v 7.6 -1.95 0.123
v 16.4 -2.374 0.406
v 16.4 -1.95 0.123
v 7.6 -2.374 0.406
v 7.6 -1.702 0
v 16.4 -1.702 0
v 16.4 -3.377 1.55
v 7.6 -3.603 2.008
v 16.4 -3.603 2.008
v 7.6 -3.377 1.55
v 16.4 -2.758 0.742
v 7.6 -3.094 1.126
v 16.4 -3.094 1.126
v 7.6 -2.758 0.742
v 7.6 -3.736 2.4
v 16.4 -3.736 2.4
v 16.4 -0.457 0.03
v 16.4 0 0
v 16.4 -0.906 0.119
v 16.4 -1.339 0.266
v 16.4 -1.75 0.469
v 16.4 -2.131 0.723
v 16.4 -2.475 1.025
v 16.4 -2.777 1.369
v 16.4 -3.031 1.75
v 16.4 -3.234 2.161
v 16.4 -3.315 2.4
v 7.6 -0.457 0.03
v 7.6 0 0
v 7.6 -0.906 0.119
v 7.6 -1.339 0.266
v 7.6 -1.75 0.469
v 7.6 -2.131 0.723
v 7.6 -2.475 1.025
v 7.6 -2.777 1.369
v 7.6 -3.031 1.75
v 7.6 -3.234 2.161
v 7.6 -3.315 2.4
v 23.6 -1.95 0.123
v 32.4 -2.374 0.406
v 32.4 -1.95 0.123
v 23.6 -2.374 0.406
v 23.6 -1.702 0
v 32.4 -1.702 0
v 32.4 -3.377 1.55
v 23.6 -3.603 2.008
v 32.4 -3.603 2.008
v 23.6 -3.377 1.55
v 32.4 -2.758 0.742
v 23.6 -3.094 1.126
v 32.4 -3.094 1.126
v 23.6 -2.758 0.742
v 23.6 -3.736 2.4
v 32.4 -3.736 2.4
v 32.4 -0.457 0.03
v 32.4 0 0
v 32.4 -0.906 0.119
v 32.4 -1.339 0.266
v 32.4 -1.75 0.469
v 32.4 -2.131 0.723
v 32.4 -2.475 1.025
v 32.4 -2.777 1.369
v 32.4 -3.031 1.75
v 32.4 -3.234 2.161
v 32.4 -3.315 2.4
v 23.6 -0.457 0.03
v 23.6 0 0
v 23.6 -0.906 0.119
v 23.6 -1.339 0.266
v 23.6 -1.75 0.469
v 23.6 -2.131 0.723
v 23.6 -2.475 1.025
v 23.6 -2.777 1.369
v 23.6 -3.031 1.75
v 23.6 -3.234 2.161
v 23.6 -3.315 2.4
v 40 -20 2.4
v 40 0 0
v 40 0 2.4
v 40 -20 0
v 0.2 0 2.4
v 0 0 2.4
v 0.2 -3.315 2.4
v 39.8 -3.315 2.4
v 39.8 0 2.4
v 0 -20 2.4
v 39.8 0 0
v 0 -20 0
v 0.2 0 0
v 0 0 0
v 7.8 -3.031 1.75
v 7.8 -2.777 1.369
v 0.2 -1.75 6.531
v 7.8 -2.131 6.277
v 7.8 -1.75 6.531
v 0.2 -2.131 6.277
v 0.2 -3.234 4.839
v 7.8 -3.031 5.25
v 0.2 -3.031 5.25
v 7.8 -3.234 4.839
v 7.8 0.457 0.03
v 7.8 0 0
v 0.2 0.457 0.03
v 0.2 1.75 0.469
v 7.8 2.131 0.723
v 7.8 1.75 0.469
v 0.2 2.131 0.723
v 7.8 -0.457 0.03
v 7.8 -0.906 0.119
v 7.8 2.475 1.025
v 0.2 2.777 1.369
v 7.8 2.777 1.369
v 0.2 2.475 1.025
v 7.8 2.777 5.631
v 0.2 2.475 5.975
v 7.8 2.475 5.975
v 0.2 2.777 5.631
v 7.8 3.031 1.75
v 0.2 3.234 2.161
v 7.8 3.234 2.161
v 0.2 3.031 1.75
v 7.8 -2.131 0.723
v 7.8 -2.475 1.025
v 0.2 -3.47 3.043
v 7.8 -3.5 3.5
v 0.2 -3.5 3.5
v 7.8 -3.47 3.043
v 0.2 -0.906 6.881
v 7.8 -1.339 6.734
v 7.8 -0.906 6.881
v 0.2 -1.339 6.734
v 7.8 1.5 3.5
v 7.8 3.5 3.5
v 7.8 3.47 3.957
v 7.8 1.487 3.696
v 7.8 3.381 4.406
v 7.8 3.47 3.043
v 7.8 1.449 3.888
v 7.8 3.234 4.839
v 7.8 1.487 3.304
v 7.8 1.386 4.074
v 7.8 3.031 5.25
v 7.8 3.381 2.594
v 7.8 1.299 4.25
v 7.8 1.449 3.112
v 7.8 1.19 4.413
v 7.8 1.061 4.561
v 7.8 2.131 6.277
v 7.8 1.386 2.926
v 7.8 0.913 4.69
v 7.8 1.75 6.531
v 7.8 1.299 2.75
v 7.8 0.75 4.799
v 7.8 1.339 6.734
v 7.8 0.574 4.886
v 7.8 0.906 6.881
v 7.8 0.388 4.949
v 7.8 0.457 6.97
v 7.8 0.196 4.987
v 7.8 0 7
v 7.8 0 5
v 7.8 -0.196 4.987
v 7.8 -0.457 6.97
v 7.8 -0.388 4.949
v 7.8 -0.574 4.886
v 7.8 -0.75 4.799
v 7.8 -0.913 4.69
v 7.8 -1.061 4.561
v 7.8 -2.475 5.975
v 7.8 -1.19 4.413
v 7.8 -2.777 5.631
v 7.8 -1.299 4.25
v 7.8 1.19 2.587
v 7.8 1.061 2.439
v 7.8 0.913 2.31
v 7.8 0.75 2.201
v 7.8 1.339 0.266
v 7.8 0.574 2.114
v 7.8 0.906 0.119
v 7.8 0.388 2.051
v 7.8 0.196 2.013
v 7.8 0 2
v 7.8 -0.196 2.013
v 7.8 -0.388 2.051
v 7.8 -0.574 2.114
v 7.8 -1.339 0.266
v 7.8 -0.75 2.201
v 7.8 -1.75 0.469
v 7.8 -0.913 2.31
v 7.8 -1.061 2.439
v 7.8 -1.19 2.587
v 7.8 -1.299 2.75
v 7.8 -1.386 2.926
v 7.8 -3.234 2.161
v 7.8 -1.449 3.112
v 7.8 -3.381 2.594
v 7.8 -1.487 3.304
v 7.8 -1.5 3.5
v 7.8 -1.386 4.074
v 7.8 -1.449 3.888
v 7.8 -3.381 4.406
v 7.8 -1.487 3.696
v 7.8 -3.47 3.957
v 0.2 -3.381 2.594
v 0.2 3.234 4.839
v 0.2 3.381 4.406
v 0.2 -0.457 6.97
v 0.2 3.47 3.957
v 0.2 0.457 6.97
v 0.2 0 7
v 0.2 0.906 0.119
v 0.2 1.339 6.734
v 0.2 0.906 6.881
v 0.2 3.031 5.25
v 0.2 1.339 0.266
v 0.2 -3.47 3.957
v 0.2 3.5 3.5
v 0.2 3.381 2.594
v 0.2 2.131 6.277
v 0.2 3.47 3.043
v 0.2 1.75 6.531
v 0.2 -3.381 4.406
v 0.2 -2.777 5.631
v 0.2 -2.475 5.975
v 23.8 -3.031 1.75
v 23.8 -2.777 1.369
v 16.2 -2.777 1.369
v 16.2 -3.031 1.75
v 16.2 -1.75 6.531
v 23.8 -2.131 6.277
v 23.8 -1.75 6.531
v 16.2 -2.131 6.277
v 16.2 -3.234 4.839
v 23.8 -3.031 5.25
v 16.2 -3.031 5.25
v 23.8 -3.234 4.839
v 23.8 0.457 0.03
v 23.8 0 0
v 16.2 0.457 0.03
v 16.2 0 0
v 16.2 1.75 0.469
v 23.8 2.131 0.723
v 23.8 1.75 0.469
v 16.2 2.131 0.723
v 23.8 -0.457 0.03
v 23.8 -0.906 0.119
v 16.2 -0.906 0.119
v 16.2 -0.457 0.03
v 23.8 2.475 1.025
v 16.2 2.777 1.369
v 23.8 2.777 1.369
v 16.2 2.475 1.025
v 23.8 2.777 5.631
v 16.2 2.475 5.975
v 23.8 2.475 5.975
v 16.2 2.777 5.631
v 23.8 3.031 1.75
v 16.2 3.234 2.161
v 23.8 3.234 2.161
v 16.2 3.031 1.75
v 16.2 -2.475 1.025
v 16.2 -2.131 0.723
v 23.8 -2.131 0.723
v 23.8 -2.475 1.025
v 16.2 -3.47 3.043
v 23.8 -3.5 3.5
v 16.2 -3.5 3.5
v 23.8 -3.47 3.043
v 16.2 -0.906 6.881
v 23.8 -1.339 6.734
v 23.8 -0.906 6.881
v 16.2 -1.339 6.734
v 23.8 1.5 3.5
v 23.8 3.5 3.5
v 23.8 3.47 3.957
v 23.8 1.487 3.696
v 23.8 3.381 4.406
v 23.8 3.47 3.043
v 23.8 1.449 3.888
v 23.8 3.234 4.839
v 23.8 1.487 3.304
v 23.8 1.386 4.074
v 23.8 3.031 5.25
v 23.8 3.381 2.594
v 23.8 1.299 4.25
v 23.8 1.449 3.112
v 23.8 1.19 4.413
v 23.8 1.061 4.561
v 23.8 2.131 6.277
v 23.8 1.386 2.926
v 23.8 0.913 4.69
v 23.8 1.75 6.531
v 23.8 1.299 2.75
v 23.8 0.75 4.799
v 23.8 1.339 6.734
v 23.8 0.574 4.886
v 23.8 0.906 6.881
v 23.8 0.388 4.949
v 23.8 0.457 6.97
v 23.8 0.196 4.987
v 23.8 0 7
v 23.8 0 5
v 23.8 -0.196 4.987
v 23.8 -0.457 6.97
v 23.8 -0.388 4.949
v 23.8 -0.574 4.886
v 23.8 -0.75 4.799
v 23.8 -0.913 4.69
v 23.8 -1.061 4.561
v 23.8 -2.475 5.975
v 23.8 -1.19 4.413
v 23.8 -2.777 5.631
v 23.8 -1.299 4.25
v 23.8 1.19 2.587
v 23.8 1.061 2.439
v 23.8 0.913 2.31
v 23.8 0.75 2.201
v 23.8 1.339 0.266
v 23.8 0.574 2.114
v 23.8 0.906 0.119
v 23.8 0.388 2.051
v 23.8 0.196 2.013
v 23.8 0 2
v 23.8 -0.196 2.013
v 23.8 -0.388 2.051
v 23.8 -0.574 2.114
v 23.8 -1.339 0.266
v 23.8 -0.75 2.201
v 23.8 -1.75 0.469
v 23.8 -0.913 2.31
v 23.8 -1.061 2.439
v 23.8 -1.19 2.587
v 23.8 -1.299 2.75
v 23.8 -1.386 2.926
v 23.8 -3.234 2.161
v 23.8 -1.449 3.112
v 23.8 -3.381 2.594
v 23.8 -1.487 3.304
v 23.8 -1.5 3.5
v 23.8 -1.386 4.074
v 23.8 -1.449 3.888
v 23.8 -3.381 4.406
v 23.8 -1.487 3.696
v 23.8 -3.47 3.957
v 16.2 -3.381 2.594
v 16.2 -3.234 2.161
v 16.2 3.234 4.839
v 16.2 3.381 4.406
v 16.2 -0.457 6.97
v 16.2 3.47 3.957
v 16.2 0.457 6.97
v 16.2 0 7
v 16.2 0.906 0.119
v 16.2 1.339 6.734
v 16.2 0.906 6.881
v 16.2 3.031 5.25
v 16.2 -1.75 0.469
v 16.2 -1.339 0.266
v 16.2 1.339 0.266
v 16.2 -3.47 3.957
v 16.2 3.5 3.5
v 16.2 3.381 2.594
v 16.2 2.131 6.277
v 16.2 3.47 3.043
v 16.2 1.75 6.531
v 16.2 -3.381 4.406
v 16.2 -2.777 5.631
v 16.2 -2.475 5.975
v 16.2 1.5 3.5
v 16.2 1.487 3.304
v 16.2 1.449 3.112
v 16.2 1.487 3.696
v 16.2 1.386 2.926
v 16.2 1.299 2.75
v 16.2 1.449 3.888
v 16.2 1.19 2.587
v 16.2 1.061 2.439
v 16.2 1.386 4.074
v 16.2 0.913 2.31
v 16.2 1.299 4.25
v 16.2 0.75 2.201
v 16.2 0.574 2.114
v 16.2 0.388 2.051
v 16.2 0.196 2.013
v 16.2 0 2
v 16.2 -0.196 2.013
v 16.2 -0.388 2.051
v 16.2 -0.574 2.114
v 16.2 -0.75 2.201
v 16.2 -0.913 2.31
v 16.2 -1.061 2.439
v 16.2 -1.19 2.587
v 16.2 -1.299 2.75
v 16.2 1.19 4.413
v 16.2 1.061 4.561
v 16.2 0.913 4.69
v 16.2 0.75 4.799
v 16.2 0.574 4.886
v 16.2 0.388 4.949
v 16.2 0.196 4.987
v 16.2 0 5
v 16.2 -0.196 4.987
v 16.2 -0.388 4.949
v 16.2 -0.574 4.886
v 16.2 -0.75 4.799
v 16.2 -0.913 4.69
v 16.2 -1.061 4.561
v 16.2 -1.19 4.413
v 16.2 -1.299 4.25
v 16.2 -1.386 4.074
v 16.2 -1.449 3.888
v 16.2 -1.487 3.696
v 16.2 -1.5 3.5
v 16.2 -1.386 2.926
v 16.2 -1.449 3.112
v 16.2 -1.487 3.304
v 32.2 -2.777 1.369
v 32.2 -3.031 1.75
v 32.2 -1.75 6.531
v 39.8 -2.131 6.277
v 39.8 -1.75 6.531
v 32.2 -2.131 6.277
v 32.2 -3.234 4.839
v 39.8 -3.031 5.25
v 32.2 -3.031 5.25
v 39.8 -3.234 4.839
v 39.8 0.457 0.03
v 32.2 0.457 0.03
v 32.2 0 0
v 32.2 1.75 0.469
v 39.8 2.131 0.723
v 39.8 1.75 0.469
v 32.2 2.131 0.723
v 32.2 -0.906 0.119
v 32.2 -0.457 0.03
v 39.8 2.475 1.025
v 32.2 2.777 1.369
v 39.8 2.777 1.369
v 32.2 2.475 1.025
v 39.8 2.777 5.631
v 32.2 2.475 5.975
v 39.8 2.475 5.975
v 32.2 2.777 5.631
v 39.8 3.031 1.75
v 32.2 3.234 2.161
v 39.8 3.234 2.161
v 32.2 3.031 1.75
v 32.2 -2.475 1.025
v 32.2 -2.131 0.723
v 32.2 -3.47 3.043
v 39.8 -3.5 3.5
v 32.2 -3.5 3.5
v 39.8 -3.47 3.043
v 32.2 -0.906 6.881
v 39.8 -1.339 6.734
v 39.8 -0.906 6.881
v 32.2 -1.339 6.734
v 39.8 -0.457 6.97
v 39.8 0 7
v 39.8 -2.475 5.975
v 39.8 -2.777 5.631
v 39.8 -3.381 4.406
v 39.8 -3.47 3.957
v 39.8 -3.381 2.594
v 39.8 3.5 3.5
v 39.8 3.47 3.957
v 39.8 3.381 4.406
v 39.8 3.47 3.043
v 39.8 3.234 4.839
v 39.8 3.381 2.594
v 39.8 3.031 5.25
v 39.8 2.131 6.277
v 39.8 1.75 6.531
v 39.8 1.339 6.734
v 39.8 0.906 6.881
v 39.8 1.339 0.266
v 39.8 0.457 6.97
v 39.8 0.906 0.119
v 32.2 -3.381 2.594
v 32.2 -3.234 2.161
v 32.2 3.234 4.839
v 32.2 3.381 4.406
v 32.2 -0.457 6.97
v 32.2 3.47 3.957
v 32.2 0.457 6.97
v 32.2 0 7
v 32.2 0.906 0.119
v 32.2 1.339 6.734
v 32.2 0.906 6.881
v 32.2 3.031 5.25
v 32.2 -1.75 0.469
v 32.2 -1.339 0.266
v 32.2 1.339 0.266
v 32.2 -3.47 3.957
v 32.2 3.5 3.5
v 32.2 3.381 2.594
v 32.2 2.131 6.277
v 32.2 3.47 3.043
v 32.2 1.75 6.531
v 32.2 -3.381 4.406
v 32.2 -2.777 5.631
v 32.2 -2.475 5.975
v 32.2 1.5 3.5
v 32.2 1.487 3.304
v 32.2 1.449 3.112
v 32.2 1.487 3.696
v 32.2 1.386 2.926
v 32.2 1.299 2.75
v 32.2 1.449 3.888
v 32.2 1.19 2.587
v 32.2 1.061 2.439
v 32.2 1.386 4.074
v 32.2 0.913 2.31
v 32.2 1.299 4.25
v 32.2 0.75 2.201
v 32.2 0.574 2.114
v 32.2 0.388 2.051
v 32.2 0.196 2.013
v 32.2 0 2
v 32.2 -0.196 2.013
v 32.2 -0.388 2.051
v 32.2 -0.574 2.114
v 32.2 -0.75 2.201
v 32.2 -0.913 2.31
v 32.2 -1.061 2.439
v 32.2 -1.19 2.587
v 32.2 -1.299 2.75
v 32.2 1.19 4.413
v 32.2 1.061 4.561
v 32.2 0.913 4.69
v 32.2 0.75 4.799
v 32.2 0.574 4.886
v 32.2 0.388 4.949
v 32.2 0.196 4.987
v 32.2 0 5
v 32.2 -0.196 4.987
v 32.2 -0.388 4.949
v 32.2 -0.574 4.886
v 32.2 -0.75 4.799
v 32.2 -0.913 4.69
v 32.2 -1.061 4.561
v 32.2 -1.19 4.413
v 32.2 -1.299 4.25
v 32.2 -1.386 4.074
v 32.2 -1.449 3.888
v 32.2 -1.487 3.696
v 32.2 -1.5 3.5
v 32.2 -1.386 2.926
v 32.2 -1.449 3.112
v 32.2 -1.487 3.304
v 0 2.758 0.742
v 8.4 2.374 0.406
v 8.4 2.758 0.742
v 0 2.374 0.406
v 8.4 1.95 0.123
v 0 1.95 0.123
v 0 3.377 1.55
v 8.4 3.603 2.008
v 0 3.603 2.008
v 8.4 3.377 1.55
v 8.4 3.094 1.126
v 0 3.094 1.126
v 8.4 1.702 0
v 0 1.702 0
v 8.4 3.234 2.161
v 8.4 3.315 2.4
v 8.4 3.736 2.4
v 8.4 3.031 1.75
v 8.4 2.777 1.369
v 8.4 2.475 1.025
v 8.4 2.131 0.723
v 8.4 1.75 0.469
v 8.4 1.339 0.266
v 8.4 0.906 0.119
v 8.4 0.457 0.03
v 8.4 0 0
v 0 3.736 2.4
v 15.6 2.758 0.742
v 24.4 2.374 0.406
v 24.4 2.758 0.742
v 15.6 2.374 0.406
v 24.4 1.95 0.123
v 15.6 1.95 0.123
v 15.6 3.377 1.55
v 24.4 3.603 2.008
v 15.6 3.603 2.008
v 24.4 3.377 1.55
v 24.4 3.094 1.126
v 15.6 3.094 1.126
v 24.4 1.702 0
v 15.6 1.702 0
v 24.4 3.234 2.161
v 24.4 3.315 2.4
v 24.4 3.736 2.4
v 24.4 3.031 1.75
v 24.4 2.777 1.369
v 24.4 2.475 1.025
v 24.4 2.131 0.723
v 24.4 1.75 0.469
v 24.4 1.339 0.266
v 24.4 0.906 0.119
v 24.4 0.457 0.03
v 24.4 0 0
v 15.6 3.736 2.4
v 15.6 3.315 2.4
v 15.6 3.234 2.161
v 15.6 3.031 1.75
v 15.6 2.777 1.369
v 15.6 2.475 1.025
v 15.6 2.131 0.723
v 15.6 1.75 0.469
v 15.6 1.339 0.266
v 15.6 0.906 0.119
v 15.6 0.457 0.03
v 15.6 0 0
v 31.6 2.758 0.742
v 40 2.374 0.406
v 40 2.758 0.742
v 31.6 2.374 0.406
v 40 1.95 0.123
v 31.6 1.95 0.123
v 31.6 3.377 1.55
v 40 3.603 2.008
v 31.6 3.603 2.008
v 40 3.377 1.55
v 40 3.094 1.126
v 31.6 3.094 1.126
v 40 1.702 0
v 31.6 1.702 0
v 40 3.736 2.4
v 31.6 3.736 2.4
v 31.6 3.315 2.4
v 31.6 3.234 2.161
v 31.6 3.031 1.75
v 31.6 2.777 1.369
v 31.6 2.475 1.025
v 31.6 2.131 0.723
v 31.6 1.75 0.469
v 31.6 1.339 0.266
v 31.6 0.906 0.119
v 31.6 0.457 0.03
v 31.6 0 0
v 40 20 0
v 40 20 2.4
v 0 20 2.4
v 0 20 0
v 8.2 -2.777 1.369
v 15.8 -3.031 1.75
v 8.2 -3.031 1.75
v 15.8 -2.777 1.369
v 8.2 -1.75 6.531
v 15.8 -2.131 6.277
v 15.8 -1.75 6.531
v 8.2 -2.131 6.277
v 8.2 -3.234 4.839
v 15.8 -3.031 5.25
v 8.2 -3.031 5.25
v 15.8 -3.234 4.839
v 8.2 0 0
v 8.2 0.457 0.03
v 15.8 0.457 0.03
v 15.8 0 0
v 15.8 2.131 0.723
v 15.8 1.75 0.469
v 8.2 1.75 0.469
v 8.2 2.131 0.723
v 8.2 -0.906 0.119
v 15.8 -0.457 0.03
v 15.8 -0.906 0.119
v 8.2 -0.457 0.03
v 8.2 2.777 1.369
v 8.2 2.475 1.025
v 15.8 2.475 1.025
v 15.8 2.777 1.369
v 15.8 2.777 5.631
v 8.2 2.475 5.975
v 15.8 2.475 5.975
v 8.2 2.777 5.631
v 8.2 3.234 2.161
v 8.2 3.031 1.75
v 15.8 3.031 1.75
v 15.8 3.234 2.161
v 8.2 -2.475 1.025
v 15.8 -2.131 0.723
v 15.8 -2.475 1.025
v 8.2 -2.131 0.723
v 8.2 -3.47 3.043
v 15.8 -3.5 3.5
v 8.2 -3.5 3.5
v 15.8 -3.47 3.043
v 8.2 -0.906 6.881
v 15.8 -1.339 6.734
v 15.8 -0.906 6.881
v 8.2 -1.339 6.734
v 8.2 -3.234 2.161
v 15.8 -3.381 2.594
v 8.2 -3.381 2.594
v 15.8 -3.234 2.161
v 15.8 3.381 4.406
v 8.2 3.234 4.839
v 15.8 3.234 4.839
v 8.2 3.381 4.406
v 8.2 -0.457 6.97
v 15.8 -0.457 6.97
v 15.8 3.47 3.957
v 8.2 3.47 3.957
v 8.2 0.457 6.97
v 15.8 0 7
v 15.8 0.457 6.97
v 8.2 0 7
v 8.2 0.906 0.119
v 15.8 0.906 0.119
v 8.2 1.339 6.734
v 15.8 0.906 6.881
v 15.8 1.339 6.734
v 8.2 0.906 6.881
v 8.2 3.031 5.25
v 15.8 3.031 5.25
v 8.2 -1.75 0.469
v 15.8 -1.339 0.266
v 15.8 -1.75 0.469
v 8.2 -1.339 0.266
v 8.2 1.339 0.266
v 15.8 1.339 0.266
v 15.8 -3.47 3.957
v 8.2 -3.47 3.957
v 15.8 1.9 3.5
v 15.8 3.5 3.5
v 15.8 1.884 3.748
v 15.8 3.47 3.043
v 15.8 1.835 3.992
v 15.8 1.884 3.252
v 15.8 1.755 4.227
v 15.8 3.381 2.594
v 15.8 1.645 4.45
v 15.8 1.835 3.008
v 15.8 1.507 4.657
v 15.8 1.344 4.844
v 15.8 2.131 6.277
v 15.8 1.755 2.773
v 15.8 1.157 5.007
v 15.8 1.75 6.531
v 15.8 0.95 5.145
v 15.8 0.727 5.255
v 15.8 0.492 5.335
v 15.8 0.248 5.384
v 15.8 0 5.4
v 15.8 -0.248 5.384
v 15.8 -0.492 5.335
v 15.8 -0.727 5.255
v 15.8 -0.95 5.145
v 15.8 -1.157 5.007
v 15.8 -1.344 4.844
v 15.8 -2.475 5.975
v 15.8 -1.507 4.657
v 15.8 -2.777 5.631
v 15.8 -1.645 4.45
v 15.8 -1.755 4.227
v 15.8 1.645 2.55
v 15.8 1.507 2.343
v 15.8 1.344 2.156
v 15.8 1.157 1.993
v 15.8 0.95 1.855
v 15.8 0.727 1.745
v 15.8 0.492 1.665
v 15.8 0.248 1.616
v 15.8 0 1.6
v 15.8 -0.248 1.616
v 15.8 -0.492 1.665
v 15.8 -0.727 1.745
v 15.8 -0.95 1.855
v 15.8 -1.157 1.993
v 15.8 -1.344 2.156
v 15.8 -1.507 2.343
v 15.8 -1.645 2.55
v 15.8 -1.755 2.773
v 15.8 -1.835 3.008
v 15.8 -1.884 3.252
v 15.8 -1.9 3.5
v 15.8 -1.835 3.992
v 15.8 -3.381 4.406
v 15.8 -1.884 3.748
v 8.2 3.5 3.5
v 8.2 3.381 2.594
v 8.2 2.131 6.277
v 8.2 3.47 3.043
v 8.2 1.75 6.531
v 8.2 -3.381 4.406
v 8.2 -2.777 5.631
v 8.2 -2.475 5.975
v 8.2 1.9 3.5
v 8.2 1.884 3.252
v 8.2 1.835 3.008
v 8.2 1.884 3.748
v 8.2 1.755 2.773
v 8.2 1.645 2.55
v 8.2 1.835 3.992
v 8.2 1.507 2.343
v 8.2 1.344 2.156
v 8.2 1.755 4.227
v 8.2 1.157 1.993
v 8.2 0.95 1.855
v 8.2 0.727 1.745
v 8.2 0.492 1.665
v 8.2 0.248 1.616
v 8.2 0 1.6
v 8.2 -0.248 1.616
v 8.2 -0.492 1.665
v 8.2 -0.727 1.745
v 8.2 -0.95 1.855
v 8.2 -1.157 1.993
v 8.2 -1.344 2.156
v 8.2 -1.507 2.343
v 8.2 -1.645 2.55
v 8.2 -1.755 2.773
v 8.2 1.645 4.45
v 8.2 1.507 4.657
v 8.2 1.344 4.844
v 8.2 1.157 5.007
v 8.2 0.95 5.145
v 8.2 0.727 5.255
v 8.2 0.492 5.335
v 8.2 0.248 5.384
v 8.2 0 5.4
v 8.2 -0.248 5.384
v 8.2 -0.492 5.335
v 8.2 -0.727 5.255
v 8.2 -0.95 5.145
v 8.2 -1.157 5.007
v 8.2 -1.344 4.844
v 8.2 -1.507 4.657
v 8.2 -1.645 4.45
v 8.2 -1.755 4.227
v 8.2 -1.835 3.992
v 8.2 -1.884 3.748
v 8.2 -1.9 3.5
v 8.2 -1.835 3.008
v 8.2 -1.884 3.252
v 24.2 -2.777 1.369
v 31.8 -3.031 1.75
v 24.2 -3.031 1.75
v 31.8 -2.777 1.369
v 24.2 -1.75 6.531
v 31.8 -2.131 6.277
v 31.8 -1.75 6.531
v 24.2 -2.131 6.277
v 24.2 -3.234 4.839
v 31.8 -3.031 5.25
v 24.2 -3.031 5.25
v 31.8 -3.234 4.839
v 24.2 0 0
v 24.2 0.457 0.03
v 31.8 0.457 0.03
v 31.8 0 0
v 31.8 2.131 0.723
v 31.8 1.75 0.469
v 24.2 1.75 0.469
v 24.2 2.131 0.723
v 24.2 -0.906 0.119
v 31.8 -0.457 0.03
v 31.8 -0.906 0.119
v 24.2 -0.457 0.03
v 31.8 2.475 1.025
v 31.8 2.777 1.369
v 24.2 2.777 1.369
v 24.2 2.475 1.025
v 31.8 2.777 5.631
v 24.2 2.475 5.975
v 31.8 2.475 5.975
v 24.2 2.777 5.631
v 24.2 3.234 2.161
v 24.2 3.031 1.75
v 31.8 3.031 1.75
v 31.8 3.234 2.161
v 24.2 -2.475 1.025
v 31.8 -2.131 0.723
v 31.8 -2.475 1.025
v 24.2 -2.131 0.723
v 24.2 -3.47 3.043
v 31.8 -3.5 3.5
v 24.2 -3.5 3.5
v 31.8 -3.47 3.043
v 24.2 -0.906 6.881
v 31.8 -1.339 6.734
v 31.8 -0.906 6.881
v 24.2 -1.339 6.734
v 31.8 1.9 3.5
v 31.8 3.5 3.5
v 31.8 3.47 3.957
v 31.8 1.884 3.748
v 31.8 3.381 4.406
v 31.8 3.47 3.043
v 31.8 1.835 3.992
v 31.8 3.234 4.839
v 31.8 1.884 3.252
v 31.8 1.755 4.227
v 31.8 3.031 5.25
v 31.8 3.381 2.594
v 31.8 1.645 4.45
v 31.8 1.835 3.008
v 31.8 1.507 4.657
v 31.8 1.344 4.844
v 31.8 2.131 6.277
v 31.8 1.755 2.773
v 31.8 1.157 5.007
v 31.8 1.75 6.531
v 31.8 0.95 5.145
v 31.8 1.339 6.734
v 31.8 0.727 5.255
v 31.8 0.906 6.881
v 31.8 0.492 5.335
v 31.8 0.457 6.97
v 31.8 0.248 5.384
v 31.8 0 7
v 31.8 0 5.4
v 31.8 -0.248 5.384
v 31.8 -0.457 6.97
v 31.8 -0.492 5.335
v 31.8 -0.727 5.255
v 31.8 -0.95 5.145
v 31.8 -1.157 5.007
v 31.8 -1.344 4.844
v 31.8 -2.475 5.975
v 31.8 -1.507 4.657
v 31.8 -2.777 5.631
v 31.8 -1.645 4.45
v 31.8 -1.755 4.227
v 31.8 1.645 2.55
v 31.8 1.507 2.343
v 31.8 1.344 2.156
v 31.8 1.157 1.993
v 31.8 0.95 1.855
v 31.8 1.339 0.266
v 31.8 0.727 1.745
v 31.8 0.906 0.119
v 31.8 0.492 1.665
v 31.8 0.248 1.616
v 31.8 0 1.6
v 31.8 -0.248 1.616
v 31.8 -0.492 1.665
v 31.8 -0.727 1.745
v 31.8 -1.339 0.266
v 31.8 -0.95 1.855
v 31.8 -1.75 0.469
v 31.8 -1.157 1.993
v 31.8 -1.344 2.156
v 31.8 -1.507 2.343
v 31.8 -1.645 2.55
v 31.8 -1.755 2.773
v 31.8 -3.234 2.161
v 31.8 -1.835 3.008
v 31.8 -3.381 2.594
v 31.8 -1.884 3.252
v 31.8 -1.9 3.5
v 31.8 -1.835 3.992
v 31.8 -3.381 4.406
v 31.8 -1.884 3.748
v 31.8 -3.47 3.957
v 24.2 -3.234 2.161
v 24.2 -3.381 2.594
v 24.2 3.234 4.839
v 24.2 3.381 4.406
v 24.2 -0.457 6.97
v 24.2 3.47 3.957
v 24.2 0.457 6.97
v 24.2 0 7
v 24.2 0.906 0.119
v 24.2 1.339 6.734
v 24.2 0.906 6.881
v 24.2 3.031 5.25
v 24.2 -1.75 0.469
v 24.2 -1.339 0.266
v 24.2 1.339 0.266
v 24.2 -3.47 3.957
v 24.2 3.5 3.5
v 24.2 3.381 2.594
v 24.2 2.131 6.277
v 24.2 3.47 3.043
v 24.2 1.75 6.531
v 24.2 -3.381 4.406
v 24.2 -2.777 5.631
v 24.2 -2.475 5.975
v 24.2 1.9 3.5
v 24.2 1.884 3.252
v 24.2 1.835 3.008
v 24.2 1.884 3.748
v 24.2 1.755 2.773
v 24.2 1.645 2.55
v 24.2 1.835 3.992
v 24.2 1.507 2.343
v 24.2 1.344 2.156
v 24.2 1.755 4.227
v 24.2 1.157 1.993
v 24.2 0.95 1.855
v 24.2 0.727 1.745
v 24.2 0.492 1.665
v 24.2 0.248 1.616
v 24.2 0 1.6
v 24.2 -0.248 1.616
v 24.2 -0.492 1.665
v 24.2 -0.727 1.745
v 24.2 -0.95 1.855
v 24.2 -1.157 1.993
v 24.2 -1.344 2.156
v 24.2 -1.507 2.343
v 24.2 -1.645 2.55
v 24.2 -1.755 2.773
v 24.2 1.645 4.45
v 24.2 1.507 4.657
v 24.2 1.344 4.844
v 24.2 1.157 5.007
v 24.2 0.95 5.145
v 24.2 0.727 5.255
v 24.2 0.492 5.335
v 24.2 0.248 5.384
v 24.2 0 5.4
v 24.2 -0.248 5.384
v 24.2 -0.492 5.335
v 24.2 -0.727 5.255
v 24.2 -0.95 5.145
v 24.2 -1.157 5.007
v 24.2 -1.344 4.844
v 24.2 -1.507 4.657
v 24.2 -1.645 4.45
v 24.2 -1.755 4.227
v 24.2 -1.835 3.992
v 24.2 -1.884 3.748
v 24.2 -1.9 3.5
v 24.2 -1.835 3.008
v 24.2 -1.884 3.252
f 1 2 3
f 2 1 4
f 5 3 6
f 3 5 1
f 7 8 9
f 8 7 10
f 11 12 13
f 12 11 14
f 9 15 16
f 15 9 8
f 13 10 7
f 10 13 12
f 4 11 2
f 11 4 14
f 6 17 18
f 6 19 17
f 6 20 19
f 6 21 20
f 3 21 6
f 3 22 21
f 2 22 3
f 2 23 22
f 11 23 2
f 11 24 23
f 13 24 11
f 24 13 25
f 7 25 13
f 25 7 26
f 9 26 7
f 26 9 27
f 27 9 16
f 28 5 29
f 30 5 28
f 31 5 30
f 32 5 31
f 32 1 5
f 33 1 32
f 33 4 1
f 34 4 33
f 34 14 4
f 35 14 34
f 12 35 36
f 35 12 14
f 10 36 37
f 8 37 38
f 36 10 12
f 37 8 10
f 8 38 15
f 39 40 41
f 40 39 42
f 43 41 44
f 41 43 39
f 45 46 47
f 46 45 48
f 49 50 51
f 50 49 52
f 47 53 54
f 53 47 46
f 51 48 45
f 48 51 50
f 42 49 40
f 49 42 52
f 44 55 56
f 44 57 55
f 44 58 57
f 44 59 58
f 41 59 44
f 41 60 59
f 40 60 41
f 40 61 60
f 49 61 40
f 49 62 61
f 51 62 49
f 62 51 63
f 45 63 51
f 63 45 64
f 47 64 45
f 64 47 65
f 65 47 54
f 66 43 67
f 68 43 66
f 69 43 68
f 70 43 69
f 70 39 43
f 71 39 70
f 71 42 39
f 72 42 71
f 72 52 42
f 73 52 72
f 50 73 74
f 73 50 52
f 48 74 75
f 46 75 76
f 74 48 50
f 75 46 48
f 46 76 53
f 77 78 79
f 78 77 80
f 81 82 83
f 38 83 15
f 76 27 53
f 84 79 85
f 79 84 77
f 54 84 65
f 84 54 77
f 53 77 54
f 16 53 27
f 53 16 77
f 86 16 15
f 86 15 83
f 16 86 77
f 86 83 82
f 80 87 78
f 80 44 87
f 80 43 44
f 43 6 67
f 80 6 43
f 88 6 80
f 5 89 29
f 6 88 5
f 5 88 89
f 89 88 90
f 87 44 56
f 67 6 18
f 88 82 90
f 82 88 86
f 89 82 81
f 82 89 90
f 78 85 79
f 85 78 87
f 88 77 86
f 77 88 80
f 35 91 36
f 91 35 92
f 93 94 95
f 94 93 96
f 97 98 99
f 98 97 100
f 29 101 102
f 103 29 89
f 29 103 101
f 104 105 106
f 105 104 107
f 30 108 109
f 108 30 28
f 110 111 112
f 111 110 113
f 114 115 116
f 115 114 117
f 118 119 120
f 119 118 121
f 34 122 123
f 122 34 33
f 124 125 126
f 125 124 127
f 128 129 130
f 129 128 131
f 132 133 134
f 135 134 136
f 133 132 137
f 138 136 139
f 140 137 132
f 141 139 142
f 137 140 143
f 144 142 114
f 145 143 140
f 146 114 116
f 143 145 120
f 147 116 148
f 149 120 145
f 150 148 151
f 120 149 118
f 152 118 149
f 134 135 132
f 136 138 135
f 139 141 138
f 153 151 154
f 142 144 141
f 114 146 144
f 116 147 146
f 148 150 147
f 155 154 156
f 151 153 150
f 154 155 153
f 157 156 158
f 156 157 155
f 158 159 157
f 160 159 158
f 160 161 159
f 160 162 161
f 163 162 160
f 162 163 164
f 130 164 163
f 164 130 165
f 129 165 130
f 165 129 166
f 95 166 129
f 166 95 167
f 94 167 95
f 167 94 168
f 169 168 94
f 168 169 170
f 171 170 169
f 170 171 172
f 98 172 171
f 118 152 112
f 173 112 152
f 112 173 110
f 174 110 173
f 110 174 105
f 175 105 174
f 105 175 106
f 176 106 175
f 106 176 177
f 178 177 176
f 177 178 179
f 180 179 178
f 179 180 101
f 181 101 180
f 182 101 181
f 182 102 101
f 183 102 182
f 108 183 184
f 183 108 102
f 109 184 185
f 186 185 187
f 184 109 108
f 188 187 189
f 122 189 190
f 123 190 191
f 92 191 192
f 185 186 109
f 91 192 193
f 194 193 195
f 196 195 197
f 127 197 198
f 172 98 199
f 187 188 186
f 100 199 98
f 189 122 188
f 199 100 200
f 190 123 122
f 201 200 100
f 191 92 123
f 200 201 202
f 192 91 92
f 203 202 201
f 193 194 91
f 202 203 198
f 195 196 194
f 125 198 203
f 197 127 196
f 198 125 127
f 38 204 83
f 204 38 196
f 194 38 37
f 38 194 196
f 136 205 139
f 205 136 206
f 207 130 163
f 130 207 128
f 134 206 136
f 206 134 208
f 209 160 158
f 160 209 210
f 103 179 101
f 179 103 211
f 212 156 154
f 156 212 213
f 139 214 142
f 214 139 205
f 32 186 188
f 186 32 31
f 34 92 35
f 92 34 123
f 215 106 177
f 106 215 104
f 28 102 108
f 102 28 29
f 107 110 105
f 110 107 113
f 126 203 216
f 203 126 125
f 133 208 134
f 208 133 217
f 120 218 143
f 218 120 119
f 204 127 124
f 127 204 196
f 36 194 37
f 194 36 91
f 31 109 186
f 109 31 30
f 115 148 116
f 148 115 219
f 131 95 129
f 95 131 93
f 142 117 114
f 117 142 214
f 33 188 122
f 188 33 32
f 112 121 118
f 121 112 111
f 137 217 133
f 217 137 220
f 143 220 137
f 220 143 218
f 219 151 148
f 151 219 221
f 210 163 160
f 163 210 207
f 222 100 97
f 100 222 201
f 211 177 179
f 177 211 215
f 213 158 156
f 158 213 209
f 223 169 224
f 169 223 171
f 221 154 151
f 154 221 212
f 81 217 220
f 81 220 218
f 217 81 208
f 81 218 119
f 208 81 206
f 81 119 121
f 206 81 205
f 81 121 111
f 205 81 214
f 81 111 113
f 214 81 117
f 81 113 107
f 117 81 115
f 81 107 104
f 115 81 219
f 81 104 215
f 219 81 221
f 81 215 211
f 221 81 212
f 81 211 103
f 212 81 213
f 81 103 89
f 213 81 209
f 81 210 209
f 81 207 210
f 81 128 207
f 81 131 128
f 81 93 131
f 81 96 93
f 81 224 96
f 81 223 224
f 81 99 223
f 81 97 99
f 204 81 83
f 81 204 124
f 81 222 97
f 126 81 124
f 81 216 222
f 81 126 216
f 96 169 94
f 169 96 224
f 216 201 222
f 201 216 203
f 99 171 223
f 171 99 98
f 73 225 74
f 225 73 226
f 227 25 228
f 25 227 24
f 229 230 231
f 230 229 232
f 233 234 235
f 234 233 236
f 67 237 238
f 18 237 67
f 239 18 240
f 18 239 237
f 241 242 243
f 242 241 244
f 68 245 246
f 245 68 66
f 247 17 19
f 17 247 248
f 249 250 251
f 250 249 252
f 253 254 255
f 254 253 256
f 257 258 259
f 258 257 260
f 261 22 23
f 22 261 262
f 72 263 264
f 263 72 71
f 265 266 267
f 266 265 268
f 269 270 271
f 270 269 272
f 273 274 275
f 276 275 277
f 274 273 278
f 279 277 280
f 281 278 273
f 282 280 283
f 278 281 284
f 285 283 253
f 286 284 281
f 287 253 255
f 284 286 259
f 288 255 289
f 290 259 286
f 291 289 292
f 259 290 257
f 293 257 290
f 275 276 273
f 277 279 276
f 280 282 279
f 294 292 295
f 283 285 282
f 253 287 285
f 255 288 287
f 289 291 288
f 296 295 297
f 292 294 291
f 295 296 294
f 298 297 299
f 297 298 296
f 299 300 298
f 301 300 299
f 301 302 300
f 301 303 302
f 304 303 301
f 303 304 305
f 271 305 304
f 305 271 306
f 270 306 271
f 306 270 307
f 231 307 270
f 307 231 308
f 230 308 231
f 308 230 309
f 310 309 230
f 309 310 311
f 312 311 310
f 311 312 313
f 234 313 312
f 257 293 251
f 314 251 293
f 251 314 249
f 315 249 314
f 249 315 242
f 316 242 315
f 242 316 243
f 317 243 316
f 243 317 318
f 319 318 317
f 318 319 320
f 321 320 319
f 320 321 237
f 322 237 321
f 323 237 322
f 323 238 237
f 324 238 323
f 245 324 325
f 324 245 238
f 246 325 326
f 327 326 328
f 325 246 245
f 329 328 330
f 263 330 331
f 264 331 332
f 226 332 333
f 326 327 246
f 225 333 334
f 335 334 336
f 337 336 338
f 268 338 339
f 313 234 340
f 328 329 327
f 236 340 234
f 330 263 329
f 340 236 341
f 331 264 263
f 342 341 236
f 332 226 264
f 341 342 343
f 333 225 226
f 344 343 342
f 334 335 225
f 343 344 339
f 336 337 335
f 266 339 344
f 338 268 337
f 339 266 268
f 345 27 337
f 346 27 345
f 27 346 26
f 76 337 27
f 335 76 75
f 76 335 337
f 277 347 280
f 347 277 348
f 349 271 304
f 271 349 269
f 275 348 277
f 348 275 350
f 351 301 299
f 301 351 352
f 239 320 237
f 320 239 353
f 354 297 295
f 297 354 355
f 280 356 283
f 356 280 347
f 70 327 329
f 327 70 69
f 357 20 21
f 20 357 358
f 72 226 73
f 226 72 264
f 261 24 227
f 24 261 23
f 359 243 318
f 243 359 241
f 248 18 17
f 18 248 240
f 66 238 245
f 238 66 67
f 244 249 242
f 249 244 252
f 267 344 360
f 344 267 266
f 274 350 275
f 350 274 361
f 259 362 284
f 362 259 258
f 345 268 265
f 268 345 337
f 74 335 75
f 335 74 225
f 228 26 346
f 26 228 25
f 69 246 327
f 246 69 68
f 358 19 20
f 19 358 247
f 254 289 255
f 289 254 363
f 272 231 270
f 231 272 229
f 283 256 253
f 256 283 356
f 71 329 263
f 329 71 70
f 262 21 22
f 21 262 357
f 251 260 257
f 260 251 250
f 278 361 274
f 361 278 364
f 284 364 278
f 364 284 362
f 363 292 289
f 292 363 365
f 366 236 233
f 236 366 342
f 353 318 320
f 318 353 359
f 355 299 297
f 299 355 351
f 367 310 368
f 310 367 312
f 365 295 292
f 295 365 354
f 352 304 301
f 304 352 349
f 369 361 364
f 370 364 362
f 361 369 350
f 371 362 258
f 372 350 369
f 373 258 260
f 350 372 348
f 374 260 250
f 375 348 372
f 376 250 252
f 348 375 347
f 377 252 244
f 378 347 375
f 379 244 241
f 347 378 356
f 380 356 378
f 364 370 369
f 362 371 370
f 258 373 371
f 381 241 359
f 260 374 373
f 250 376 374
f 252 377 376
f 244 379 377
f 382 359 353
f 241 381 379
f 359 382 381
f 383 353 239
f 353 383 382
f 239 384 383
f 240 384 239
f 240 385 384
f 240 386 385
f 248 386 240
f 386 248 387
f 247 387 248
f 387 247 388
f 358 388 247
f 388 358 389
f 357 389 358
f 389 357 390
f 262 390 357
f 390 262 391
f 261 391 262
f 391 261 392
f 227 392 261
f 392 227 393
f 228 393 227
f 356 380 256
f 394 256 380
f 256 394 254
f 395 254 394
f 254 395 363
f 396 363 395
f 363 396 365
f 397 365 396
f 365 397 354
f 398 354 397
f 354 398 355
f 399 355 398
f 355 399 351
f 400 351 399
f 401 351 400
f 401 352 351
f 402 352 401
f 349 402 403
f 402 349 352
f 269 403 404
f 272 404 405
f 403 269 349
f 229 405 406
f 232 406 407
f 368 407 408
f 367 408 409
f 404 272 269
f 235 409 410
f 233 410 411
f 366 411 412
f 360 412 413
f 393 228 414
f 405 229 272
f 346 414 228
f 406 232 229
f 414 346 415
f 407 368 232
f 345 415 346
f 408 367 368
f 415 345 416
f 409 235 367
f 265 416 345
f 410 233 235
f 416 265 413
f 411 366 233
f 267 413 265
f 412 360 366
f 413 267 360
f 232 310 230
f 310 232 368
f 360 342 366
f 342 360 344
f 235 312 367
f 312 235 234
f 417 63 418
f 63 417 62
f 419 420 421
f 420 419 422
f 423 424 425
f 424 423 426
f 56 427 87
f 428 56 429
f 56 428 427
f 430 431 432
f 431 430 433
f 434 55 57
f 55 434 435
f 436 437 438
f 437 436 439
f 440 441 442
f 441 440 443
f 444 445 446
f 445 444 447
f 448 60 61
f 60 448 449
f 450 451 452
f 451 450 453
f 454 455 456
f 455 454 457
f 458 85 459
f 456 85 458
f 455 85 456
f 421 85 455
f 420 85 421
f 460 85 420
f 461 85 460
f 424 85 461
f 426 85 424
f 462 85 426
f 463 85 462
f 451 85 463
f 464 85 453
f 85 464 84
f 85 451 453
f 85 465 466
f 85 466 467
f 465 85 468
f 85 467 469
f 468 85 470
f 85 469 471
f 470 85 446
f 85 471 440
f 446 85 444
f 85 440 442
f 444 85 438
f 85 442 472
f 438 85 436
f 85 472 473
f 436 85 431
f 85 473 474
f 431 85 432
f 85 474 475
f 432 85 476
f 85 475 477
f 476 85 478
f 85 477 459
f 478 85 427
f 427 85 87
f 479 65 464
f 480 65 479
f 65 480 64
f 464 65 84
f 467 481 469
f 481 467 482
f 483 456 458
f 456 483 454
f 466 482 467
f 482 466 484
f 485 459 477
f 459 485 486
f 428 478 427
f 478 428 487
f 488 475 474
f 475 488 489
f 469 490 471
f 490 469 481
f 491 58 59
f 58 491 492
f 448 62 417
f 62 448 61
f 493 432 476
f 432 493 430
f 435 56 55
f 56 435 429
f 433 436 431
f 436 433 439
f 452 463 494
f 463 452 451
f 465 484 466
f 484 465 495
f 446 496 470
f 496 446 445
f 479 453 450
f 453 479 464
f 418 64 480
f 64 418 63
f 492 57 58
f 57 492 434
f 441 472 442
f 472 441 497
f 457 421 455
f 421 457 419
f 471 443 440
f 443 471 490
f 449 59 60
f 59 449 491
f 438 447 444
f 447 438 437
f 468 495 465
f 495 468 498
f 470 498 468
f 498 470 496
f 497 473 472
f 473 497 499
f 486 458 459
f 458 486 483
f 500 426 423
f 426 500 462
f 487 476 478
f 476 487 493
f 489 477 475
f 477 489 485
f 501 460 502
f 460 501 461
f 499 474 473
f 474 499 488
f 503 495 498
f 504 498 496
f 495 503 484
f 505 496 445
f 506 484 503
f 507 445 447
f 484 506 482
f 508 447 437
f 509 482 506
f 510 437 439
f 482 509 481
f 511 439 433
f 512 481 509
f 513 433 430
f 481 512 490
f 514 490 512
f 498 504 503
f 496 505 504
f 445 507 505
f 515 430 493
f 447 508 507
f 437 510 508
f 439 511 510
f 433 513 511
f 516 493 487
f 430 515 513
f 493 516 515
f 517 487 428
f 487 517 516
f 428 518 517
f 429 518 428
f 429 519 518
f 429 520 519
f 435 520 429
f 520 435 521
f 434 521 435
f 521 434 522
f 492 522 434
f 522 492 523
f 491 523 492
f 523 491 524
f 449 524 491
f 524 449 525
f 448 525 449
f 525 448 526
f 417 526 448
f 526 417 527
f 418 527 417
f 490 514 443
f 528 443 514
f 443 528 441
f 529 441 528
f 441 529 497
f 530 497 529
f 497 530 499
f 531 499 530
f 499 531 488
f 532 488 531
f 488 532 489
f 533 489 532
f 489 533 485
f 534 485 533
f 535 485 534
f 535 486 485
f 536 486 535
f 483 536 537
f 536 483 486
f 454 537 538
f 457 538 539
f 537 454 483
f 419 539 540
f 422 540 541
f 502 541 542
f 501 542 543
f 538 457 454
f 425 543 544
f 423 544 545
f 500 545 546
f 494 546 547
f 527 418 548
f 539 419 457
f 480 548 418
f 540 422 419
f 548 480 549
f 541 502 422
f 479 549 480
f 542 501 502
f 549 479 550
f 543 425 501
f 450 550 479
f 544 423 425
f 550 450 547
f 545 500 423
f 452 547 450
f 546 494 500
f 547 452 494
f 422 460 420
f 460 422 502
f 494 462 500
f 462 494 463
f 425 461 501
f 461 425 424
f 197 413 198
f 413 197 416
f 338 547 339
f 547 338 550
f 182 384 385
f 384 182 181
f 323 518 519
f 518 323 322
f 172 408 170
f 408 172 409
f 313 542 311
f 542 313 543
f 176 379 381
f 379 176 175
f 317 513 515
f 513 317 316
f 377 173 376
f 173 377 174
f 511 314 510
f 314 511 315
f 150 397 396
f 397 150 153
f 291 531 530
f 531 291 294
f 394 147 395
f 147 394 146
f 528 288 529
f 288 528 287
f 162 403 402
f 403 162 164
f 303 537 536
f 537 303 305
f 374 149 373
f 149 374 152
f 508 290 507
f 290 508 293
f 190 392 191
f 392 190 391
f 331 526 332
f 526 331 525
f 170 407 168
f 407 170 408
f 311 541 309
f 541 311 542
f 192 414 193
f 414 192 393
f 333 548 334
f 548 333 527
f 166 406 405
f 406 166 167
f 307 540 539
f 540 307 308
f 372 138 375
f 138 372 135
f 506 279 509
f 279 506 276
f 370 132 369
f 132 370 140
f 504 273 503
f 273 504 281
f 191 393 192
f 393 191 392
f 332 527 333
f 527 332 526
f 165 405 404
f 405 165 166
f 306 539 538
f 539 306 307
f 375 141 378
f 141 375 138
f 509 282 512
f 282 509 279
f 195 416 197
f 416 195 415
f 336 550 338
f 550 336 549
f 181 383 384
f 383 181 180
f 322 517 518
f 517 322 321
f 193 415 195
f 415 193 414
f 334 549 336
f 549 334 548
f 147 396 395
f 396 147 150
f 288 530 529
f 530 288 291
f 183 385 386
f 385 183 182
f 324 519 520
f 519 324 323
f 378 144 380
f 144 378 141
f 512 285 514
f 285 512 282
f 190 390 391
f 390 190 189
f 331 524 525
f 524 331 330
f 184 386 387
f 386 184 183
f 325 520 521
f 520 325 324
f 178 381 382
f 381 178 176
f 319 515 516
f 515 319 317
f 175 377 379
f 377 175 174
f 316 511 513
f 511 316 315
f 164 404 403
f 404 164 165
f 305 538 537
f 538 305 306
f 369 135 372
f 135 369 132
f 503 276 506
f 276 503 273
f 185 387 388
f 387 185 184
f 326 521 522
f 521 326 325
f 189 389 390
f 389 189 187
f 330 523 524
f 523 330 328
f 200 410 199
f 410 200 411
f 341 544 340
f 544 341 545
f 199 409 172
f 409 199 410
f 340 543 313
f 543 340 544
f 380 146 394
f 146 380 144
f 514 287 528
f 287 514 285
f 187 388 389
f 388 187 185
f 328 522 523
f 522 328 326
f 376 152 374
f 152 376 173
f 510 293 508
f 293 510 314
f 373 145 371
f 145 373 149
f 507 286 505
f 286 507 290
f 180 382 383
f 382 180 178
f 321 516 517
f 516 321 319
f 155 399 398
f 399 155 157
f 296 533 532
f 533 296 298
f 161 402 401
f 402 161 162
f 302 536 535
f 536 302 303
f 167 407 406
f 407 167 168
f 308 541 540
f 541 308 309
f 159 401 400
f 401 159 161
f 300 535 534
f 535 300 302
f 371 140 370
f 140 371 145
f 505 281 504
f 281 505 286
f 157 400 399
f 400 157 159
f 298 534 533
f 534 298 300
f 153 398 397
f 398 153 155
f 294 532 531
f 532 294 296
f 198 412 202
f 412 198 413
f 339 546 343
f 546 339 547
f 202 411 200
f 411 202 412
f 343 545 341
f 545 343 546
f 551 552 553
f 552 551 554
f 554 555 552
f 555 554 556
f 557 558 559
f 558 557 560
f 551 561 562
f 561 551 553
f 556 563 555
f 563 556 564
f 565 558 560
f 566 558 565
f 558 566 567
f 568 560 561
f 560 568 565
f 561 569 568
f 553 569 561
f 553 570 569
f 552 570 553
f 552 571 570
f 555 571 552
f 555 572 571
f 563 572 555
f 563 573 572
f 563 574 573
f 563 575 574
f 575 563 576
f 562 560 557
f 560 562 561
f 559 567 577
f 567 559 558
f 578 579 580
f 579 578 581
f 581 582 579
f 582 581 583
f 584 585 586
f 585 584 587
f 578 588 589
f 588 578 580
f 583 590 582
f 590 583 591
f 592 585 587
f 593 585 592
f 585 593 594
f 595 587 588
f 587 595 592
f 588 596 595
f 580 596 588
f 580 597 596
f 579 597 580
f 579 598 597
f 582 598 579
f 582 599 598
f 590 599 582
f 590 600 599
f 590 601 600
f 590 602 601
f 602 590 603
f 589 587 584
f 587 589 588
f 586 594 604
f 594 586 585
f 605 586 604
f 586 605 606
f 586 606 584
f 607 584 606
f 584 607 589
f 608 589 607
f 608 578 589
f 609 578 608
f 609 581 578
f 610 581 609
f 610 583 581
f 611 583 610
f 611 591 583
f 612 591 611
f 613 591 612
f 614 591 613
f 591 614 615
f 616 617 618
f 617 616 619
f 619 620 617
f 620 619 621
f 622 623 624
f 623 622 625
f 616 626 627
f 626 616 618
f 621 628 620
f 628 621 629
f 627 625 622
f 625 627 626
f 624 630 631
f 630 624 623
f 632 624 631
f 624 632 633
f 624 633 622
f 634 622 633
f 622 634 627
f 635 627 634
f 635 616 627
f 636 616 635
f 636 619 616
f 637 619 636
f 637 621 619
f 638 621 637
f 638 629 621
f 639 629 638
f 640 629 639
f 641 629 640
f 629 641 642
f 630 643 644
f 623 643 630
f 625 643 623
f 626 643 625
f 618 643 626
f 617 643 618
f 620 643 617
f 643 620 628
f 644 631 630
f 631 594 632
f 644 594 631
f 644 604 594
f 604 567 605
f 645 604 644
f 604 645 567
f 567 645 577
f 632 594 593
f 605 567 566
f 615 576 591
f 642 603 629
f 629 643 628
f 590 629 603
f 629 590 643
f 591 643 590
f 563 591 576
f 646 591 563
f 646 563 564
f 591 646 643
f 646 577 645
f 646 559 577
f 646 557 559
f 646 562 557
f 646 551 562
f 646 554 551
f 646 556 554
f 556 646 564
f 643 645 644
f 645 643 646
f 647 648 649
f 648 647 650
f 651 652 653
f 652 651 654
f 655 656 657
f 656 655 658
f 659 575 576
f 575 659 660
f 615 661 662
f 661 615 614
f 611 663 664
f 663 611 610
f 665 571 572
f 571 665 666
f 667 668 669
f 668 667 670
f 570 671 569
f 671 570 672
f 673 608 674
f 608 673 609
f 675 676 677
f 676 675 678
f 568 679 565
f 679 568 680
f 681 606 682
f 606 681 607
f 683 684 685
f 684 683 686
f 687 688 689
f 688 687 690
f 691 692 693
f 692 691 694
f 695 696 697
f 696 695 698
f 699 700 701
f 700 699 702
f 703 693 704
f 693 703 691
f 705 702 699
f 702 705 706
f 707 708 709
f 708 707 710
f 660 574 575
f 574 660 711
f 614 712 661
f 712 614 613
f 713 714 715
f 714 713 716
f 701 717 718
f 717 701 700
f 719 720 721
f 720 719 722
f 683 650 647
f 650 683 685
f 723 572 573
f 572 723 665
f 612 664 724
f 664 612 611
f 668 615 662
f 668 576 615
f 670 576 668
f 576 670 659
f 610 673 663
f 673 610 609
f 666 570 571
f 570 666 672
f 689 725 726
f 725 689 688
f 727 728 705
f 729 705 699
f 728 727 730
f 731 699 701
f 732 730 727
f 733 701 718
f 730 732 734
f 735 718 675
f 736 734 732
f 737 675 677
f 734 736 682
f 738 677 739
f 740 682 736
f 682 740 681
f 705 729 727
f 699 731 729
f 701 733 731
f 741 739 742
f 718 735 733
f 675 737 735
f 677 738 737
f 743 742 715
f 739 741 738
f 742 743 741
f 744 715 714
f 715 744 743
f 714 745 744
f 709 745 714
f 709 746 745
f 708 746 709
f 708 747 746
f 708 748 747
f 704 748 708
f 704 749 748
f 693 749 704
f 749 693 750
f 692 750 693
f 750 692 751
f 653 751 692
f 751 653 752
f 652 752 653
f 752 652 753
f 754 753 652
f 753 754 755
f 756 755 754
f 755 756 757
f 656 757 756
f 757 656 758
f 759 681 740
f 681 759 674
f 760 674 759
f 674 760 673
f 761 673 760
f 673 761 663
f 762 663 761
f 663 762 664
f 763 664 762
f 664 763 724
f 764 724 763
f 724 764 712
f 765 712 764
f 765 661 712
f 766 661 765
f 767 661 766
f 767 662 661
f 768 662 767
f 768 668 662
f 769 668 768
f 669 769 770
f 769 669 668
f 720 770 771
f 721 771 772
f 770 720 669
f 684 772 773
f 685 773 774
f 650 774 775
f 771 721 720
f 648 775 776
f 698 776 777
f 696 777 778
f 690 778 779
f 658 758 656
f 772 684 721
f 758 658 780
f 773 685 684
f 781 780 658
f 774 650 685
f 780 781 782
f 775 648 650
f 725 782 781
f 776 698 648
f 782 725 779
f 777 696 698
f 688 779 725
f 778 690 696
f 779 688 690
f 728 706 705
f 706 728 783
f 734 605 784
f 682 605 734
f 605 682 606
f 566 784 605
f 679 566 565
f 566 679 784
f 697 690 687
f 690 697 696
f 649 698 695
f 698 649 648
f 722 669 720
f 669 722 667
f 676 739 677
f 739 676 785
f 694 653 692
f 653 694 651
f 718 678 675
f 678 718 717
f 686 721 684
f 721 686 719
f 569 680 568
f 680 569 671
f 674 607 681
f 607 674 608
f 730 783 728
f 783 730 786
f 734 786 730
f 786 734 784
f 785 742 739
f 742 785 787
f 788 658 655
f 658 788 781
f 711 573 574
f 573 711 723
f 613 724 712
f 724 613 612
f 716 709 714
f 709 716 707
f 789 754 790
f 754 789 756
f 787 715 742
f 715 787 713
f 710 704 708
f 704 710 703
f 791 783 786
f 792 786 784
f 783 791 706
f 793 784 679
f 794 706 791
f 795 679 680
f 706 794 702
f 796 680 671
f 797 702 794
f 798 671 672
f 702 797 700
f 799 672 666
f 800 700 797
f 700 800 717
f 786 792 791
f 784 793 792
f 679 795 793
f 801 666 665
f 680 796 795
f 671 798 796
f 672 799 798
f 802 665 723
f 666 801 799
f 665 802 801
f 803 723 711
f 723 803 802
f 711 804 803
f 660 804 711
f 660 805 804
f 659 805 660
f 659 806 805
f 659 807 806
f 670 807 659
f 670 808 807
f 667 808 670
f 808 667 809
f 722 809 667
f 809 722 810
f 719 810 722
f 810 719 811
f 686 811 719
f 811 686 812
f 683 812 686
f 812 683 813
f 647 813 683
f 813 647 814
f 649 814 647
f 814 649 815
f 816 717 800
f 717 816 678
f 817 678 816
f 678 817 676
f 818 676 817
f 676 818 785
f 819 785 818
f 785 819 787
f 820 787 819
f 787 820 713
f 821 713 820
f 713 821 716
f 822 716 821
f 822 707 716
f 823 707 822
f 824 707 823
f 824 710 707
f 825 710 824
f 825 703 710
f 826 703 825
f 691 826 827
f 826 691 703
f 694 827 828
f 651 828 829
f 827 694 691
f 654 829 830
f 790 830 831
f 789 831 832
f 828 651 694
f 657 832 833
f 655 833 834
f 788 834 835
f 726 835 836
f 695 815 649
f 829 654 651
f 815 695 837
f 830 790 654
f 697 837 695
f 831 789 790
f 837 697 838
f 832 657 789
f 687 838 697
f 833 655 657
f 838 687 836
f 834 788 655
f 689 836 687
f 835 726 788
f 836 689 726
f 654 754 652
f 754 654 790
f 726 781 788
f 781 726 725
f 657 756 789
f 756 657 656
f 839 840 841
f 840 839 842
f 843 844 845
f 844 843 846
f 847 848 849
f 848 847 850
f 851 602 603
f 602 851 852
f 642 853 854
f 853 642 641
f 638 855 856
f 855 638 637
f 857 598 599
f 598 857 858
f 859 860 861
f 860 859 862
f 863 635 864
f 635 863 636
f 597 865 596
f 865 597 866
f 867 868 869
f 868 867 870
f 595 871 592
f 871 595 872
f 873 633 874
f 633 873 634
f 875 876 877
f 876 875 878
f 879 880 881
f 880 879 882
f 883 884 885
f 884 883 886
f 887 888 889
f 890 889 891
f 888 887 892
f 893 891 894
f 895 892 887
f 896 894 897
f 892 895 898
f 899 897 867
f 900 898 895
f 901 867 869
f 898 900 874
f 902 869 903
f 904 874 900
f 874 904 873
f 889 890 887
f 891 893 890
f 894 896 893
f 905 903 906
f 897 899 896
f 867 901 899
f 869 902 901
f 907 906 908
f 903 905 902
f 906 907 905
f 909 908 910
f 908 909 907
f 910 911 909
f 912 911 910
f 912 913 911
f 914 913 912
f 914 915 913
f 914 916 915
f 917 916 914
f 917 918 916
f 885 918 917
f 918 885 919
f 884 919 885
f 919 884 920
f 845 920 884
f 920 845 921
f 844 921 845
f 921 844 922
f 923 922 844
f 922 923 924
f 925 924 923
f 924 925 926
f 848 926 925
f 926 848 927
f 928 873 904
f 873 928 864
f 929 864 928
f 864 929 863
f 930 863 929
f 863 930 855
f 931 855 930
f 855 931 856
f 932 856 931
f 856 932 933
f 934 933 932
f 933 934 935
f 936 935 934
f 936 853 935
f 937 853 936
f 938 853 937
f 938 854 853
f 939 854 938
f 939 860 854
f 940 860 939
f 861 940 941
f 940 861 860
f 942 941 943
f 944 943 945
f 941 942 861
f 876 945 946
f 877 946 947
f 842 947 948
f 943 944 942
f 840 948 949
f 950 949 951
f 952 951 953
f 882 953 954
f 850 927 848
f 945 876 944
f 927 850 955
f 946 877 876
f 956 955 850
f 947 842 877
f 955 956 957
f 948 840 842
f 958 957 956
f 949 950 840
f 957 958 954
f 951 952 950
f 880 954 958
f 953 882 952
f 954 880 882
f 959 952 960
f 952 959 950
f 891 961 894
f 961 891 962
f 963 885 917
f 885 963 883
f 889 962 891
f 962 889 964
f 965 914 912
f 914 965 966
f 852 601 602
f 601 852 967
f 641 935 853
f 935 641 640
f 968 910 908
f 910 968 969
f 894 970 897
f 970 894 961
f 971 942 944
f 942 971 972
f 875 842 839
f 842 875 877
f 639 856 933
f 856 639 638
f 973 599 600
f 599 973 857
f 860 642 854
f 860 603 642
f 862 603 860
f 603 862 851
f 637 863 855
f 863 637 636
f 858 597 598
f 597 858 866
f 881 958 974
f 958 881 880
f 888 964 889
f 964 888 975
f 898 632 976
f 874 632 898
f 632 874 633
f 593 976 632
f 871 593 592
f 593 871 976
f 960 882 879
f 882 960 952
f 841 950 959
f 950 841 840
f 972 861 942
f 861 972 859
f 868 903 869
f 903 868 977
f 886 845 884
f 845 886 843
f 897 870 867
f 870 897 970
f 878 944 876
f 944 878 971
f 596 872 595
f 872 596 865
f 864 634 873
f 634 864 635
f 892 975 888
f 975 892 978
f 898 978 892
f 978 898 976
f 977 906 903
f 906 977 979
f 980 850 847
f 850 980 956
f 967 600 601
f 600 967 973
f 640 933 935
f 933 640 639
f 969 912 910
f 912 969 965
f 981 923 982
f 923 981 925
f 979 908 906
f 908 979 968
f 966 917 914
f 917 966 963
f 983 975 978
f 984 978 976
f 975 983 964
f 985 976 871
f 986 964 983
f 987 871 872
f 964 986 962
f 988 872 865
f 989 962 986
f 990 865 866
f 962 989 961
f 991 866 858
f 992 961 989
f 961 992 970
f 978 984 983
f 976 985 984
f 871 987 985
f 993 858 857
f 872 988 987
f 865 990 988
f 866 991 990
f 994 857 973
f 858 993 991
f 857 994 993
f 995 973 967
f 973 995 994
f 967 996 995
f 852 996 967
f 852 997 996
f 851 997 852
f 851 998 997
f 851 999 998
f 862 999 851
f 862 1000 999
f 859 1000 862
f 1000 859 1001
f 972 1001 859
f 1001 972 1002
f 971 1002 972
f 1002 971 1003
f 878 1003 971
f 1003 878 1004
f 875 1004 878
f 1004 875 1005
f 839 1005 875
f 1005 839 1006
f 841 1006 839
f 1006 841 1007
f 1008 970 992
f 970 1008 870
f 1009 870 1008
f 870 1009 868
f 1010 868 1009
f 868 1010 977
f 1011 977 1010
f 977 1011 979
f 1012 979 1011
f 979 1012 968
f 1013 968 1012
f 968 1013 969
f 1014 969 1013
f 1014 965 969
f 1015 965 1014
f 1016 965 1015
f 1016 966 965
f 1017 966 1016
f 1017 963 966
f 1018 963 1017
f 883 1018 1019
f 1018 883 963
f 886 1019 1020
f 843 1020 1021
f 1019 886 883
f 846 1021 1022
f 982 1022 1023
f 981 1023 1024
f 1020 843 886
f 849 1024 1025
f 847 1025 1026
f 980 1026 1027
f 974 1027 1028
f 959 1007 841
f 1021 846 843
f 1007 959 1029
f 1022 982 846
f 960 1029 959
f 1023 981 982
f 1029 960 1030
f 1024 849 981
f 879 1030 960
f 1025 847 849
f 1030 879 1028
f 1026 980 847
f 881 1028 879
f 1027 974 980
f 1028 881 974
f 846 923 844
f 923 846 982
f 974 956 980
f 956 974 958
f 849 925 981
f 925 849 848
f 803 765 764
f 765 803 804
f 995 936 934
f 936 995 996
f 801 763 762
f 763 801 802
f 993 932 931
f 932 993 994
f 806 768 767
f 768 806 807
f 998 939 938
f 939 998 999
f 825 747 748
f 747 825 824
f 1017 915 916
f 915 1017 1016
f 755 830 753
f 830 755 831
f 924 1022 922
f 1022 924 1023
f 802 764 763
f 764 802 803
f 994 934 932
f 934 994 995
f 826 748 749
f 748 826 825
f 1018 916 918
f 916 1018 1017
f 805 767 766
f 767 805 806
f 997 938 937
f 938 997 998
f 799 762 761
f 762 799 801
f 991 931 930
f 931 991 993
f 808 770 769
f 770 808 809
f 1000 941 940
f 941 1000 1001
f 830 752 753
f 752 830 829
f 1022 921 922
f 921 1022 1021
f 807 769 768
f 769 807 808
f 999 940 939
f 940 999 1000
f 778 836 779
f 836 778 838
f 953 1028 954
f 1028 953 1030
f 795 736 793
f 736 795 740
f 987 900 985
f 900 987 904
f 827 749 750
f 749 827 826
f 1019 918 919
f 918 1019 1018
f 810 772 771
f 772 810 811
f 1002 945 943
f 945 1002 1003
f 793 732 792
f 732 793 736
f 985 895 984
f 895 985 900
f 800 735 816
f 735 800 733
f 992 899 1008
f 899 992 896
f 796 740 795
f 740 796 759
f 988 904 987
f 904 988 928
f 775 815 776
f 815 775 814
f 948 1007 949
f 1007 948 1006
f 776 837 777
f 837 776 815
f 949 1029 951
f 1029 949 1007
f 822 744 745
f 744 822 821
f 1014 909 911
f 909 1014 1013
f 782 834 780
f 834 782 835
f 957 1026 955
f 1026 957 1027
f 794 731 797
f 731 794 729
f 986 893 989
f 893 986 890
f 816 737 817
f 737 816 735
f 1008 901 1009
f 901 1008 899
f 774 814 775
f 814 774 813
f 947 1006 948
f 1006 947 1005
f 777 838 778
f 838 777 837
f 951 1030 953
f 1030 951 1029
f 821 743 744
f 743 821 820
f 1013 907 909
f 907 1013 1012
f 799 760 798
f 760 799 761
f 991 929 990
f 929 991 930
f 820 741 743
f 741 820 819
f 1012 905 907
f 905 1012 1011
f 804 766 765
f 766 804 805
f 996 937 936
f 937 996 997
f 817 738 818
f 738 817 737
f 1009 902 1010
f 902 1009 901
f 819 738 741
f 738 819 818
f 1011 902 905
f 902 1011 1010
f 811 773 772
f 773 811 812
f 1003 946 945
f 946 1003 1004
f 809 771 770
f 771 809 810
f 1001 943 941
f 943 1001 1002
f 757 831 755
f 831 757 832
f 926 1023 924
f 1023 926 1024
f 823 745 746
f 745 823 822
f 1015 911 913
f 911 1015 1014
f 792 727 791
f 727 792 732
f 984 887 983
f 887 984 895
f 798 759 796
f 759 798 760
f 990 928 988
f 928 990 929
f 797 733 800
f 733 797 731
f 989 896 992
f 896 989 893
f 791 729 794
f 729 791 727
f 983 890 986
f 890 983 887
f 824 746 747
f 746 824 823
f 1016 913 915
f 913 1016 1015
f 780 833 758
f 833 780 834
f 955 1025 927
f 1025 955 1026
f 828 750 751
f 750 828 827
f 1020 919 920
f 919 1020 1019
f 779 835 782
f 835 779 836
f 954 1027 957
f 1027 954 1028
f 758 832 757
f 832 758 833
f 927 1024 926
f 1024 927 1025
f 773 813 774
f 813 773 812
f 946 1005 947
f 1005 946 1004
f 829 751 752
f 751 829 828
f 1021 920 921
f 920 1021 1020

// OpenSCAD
// Print-in-place hinge
// Two leaves joined by alternating knuckles around a captive pin. Prints flat, no supports.

/* [Hinge] */
// Hinge length along the pin (mm)
hinge_length = 40; // [15:1:150]
// Length of each leaf (mm)
leaf_length = 20; // [8:1:80]
// Number of knuckles (odd)
knuckles = 5; // [3:2:11]

/* [Fit] */
// Pin diameter (mm)
pin_diameter = 3; // [2:0.5:8]
// Gap between moving parts (mm)
clearance = 0.4; // [0.2:0.05:0.8]

/* [Hidden] */
knuckle_wall = 1.6;
leaf_thickness = 2.4;
$fn = 48;

knuckle_d = pin_diameter + 2 * (clearance + knuckle_wall);
axis_z = knuckle_d / 2;
segment = hinge_length / knuckles;

module along_axis(x0, len, d) {
  translate([x0, 0, axis_z]) rotate([0, 90, 0]) cylinder(h = len, d = d);
}

// owner 0 is the leaf at negative Y and carries the pin; owner 1 is the leaf at positive Y.
module leaf(owner) {
  difference() {
    translate([0, owner == 0 ? -leaf_length : 0, 0])
      cube([hinge_length, leaf_length, leaf_thickness]);
    for (i = [0:knuckles - 1])
      if (i % 2 != owner)
        along_axis(i * segment - clearance, segment + 2 * clearance, knuckle_d + 2 * clearance);
  }
}

module knuckles_of(owner) {
  for (i = [0:knuckles - 1])
    if (i % 2 == owner)
      along_axis(i * segment + clearance / 2, segment - clearance, knuckle_d);
}

module side_a() {
  leaf(0);
  knuckles_of(0);
  along_axis(clearance / 2, hinge_length - clearance, pin_diameter);
}

module side_b() {
  difference() {
    union() {
      leaf(1);
      knuckles_of(1);
    }
    along_axis(-1, hinge_length + 2, pin_diameter + 2 * clearance);
  }
}

side_a();
side_b();
